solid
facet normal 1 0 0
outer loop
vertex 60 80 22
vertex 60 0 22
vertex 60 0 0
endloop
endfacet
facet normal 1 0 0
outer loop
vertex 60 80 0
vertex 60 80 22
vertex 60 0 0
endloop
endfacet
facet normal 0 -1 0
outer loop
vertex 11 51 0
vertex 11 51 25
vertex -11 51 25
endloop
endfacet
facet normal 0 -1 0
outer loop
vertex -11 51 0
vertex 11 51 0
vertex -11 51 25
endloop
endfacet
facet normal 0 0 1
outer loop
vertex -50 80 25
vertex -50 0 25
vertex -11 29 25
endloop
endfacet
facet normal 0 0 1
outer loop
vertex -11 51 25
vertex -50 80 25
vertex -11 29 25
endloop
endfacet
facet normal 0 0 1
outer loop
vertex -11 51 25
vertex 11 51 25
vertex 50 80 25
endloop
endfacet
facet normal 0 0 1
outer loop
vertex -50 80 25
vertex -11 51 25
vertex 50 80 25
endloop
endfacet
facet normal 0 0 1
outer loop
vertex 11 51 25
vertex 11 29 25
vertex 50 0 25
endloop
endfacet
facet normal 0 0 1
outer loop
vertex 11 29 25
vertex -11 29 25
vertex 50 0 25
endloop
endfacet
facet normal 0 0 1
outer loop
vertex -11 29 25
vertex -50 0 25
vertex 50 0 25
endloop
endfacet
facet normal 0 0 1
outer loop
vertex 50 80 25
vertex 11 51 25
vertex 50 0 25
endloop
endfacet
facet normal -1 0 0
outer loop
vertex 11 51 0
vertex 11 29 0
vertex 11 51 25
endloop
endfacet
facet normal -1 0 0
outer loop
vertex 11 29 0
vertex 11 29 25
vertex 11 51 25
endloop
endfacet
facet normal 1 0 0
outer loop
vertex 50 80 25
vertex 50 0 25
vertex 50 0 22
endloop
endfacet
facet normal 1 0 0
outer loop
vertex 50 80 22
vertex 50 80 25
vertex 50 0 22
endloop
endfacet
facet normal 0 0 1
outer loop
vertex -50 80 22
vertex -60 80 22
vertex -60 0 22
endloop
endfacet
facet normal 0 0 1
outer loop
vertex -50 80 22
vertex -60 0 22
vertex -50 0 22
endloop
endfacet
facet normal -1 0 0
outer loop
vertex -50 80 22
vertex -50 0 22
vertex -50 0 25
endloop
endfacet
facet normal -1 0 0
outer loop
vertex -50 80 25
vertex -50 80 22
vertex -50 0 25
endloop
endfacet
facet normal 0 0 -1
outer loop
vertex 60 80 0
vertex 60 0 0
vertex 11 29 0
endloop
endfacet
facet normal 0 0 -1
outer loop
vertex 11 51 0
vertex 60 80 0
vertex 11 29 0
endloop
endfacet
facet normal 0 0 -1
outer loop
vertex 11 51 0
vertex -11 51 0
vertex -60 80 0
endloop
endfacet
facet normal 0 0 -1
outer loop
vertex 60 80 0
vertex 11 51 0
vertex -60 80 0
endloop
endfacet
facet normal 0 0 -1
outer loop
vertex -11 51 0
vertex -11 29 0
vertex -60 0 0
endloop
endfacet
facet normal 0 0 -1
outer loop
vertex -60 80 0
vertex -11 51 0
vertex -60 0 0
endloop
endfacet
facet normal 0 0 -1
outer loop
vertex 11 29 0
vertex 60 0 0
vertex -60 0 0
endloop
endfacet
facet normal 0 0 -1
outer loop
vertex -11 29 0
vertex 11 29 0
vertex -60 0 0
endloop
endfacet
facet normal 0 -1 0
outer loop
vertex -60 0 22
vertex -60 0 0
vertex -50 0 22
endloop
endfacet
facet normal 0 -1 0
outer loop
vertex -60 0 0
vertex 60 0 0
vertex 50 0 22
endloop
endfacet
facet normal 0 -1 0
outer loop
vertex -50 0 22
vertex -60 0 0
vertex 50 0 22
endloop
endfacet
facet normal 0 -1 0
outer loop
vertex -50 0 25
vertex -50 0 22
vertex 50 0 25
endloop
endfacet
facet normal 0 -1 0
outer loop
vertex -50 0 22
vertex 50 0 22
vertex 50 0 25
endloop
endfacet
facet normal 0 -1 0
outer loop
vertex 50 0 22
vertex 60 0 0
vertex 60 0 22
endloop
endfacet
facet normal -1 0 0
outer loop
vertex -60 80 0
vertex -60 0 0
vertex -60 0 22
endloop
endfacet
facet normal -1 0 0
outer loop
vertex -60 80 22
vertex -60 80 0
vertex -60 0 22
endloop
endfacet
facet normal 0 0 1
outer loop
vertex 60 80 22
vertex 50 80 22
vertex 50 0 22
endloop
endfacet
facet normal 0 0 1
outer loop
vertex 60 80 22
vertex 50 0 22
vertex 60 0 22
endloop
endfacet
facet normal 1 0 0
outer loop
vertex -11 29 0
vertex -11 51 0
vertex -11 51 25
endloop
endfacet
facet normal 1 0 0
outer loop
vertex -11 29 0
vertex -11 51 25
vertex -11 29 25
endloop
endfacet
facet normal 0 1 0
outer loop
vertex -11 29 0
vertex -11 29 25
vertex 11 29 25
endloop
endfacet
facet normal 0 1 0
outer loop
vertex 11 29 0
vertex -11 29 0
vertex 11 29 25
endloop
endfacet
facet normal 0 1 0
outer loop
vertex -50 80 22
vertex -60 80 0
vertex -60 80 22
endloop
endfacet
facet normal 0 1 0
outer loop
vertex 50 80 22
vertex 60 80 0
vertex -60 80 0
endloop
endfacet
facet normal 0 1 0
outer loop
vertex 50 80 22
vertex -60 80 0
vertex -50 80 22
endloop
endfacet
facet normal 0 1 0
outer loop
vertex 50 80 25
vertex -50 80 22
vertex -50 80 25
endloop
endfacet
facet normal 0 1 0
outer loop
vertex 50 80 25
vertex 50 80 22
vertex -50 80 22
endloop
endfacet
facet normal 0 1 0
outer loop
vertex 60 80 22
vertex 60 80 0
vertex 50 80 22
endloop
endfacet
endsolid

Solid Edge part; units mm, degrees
sketch "Sketch1" plane through (0, 0, 0) normal (0, -1, 0) x (1, 0, 0)
  line L0 (-60, 0) -> (-60, 22)
  line L1 (-60, 22) -> (-50, 22)
  line L2 (-50, 22) -> (-50, 25)
  line L3 (-50, 25) -> (50, 25)
  line L4 (50, 25) -> (50, 22)
  line L5 (50, 22) -> (60, 22)
  line L6 (60, 22) -> (60, 0)
  line L7 (60, 0) -> (-60, 0)
extrude "Protrusion1" add sketch "Sketch1" against normal blind 80
sketch "Sketch2" plane through (0, 40, 25) normal (0, 0, 1) x (1, 0, 0)
  line L0 (-11, -11) -> (11, -11)
  line L1 (11, -11) -> (11, 11)
  line L2 (11, 11) -> (-11, 11)
  line L3 (-11, 11) -> (-11, -11)
extrude "ExtrudedCutout_1" cut sketch "Sketch2" against normal blind 41.8556
